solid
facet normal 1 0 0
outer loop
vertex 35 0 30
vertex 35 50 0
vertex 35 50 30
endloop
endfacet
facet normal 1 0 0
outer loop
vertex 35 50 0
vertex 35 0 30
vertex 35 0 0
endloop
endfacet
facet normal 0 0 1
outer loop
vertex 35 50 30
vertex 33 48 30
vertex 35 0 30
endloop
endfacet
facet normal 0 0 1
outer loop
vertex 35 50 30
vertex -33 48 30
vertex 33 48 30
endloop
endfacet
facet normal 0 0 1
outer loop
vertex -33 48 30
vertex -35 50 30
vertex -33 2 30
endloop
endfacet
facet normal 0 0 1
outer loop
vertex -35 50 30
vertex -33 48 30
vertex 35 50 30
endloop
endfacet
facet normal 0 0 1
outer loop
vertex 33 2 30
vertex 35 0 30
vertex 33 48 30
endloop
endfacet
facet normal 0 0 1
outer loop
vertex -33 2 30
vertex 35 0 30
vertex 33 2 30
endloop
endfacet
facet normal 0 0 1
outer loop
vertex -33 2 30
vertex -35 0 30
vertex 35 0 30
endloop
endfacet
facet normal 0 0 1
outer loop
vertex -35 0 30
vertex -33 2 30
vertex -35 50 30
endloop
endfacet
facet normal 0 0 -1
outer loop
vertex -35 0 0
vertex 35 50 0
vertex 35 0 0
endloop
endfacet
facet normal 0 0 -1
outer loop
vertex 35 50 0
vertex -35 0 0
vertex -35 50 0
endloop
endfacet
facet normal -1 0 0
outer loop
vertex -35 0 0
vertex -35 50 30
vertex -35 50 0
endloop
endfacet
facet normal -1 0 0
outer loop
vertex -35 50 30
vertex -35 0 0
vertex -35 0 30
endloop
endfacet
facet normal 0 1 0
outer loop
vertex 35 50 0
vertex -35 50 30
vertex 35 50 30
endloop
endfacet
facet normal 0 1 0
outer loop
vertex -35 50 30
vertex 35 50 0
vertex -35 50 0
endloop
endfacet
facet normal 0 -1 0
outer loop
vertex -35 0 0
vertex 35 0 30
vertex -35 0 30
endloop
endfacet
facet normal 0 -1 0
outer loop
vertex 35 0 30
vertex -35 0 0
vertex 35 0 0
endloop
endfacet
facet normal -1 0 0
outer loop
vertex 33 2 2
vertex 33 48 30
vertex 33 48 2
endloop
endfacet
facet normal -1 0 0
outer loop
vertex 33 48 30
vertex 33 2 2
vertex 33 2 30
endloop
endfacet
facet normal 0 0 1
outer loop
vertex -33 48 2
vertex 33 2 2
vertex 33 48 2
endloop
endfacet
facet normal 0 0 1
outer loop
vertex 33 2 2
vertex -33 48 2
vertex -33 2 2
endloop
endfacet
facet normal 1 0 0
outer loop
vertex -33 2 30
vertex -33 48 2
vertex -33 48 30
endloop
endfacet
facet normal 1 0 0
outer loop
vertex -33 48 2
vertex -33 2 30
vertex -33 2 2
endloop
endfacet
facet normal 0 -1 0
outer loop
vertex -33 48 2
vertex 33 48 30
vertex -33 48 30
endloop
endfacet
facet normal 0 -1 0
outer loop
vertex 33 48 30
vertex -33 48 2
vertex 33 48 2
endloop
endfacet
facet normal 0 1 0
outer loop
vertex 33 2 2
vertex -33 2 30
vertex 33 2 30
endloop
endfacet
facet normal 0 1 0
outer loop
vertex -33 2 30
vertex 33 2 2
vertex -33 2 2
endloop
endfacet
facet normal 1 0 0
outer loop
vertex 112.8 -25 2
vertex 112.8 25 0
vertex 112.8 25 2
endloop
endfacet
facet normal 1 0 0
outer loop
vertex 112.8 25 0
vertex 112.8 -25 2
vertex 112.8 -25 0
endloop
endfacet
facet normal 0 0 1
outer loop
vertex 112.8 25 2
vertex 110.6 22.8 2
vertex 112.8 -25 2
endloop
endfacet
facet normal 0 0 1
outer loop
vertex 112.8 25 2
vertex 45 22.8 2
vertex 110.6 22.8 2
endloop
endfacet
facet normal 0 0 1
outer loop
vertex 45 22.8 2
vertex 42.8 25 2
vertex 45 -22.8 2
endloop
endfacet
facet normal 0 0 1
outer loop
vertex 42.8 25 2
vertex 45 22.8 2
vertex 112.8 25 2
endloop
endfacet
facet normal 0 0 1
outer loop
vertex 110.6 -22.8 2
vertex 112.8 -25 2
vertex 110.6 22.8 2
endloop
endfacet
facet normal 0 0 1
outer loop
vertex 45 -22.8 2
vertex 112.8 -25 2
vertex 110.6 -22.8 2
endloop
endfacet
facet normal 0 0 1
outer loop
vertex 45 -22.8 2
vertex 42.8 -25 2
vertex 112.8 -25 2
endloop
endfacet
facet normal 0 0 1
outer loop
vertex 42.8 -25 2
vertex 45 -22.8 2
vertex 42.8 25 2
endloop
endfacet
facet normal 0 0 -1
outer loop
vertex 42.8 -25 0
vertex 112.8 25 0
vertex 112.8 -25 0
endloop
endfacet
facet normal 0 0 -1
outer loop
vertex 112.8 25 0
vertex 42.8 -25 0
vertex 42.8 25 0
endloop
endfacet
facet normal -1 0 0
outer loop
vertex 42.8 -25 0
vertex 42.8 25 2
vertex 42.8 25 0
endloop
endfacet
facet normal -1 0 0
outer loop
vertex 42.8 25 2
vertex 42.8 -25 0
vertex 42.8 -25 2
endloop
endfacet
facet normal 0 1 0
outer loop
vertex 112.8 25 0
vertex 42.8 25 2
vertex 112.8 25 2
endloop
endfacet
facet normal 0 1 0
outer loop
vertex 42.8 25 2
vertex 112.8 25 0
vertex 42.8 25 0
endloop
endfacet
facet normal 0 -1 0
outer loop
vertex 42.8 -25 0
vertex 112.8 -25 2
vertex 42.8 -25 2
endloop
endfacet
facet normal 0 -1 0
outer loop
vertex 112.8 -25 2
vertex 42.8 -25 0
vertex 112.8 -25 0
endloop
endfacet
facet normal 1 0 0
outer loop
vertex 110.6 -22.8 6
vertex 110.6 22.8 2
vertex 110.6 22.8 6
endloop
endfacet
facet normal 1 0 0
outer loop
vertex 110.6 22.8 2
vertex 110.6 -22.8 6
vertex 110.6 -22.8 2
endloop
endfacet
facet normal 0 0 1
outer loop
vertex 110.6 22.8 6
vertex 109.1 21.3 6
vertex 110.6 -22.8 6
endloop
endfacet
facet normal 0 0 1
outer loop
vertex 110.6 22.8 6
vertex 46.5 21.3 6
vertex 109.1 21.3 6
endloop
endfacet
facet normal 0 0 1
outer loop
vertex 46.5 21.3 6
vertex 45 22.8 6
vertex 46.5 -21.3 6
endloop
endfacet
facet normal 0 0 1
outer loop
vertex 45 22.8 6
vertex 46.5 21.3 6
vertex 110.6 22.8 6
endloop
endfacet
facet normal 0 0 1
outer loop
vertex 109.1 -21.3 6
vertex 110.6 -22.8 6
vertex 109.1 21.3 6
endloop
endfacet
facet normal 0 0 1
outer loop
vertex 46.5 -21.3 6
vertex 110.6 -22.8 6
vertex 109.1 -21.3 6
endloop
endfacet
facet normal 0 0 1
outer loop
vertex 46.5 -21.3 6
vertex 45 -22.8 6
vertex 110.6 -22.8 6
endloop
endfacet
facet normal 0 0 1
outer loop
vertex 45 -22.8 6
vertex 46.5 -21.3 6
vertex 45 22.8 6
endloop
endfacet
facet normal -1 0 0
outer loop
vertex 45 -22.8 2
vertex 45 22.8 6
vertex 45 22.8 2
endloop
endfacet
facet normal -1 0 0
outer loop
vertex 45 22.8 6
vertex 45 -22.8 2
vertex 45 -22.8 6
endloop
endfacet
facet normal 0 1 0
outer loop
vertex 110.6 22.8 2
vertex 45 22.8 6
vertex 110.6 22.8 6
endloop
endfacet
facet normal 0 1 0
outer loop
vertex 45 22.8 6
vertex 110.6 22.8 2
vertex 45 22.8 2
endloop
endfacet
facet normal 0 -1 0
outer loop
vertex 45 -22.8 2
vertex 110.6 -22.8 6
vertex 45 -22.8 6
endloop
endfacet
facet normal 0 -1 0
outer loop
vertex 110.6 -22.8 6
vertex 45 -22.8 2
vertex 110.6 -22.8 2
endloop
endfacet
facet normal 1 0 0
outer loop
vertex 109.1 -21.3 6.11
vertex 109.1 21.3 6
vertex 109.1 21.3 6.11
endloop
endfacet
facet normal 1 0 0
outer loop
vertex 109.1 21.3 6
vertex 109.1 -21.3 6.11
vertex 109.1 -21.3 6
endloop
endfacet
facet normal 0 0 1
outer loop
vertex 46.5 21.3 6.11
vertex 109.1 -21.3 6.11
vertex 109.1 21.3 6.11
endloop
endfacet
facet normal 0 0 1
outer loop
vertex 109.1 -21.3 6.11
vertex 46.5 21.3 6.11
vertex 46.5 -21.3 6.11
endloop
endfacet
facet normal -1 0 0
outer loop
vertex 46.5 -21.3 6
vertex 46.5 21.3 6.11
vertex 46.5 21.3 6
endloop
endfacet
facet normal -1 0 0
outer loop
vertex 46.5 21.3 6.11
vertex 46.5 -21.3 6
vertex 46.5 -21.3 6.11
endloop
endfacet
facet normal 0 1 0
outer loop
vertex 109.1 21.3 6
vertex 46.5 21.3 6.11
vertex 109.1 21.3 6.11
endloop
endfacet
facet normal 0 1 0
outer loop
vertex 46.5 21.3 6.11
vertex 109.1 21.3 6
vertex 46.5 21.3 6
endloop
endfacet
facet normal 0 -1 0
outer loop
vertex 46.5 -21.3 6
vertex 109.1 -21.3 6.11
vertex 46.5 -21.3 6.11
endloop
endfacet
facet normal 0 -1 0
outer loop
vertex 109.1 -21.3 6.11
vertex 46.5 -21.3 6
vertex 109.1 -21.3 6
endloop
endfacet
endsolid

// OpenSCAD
// Enclosure for Arduino-based temperature logger
// Part 1: Box (base)
// Part 2: Lid (with lip)

// Global settings
$fn = 64; // High resolution for curves

// Box dimensions (outer)
box_outer_x = 70;
box_outer_y = 50;
box_outer_z = 30;

// Wall and floor thickness
wall_thick = 2;
floor_thick = 2;

// Lid dimensions
lid_plate_z = 2;
lid_lip_height = 4;
lid_lip_thick = 1.5;
lid_lip_outer_x = 65.6;
lid_lip_outer_y = 45.6;
lid_clearance = 0.2; // clearance on each side

// Gap between parts for printing
gap = 10;

// Compute inner dimensions of box
box_inner_x = box_outer_x - 2 * wall_thick;
box_inner_y = box_outer_y - 2 * wall_thick;

// Positioning: Box centered at origin, lid on +X side with gap
box_x_pos = -box_outer_x / 2;
box_y_pos = 0;

// Lid plate should be 70 x 50 mm, centered on its own center
// The lip is centered on the plate, so lid plate center = lip center
lid_plate_x = box_x_pos + box_outer_x + gap + lid_lip_outer_x / 2;
lid_plate_y = 0;

// Part 1: Box (base)
module box_part() {
    // Outer shell
    difference() {
        // Outer box
        translate([box_x_pos, box_y_pos, 0])
            cube([box_outer_x, box_outer_y, box_outer_z]);
        
        // Inner cavity (hollow)
        translate([box_x_pos + wall_thick, box_y_pos + wall_thick, floor_thick])
            cube([box_inner_x, box_inner_y, box_outer_z + 0.1]);
    }
    
    // Floor (solid base)
    translate([box_x_pos, box_y_pos, 0])
        cube([box_outer_x, box_outer_y, floor_thick]);
}

// Part 2: Lid (printed upside down)
module lid_part() {
    // Plate (base of lid) - 70 x 50 x 2 mm
    // Center the plate at lid_plate_x, lid_plate_y
    plate_x = lid_plate_x - 70/2;
    plate_y = lid_plate_y - 50/2;
    translate([plate_x, plate_y, 0])
        cube([70, 50, lid_plate_z]);
    
    // Lip (upward from plate, printed upside down)
    // Lip outer dimensions: lid_lip_outer_x x lid_lip_outer_y
    // Lip thickness: lid_lip_thick
    // Lip height: lid_lip_height (exactly 4 mm)
    
    // Center the lip on the plate
    lip_x = lid_plate_x - lid_lip_outer_x / 2;
    lip_y = lid_plate_y - lid_lip_outer_y / 2;
    
    // Outer lip cube
    translate([lip_x, lip_y, lid_plate_z])
        cube([lid_lip_outer_x, lid_lip_outer_y, lid_lip_height]);
    
    // Hollow out the lip (to create the inner cavity for sliding fit)
    // Inner dimensions: lid_lip_outer_x - 2*lid_lip_thick, lid_lip_outer_y - 2*lid_lip_thick
    inner_lip_x = lip_x + lid_lip_thick;
    inner_lip_y = lip_y + lid_lip_thick;
    inner_lip_x_size = lid_lip_outer_x - 2 * lid_lip_thick;
    inner_lip_y_size = lid_lip_outer_y - 2 * lid_lip_thick;
    
    translate([inner_lip_x, inner_lip_y, lid_plate_z + 0.01])
        cube([inner_lip_x_size, inner_lip_y_size, lid_lip_height + 0.1]);
}

// Render both parts
box_part();
lid_part();
